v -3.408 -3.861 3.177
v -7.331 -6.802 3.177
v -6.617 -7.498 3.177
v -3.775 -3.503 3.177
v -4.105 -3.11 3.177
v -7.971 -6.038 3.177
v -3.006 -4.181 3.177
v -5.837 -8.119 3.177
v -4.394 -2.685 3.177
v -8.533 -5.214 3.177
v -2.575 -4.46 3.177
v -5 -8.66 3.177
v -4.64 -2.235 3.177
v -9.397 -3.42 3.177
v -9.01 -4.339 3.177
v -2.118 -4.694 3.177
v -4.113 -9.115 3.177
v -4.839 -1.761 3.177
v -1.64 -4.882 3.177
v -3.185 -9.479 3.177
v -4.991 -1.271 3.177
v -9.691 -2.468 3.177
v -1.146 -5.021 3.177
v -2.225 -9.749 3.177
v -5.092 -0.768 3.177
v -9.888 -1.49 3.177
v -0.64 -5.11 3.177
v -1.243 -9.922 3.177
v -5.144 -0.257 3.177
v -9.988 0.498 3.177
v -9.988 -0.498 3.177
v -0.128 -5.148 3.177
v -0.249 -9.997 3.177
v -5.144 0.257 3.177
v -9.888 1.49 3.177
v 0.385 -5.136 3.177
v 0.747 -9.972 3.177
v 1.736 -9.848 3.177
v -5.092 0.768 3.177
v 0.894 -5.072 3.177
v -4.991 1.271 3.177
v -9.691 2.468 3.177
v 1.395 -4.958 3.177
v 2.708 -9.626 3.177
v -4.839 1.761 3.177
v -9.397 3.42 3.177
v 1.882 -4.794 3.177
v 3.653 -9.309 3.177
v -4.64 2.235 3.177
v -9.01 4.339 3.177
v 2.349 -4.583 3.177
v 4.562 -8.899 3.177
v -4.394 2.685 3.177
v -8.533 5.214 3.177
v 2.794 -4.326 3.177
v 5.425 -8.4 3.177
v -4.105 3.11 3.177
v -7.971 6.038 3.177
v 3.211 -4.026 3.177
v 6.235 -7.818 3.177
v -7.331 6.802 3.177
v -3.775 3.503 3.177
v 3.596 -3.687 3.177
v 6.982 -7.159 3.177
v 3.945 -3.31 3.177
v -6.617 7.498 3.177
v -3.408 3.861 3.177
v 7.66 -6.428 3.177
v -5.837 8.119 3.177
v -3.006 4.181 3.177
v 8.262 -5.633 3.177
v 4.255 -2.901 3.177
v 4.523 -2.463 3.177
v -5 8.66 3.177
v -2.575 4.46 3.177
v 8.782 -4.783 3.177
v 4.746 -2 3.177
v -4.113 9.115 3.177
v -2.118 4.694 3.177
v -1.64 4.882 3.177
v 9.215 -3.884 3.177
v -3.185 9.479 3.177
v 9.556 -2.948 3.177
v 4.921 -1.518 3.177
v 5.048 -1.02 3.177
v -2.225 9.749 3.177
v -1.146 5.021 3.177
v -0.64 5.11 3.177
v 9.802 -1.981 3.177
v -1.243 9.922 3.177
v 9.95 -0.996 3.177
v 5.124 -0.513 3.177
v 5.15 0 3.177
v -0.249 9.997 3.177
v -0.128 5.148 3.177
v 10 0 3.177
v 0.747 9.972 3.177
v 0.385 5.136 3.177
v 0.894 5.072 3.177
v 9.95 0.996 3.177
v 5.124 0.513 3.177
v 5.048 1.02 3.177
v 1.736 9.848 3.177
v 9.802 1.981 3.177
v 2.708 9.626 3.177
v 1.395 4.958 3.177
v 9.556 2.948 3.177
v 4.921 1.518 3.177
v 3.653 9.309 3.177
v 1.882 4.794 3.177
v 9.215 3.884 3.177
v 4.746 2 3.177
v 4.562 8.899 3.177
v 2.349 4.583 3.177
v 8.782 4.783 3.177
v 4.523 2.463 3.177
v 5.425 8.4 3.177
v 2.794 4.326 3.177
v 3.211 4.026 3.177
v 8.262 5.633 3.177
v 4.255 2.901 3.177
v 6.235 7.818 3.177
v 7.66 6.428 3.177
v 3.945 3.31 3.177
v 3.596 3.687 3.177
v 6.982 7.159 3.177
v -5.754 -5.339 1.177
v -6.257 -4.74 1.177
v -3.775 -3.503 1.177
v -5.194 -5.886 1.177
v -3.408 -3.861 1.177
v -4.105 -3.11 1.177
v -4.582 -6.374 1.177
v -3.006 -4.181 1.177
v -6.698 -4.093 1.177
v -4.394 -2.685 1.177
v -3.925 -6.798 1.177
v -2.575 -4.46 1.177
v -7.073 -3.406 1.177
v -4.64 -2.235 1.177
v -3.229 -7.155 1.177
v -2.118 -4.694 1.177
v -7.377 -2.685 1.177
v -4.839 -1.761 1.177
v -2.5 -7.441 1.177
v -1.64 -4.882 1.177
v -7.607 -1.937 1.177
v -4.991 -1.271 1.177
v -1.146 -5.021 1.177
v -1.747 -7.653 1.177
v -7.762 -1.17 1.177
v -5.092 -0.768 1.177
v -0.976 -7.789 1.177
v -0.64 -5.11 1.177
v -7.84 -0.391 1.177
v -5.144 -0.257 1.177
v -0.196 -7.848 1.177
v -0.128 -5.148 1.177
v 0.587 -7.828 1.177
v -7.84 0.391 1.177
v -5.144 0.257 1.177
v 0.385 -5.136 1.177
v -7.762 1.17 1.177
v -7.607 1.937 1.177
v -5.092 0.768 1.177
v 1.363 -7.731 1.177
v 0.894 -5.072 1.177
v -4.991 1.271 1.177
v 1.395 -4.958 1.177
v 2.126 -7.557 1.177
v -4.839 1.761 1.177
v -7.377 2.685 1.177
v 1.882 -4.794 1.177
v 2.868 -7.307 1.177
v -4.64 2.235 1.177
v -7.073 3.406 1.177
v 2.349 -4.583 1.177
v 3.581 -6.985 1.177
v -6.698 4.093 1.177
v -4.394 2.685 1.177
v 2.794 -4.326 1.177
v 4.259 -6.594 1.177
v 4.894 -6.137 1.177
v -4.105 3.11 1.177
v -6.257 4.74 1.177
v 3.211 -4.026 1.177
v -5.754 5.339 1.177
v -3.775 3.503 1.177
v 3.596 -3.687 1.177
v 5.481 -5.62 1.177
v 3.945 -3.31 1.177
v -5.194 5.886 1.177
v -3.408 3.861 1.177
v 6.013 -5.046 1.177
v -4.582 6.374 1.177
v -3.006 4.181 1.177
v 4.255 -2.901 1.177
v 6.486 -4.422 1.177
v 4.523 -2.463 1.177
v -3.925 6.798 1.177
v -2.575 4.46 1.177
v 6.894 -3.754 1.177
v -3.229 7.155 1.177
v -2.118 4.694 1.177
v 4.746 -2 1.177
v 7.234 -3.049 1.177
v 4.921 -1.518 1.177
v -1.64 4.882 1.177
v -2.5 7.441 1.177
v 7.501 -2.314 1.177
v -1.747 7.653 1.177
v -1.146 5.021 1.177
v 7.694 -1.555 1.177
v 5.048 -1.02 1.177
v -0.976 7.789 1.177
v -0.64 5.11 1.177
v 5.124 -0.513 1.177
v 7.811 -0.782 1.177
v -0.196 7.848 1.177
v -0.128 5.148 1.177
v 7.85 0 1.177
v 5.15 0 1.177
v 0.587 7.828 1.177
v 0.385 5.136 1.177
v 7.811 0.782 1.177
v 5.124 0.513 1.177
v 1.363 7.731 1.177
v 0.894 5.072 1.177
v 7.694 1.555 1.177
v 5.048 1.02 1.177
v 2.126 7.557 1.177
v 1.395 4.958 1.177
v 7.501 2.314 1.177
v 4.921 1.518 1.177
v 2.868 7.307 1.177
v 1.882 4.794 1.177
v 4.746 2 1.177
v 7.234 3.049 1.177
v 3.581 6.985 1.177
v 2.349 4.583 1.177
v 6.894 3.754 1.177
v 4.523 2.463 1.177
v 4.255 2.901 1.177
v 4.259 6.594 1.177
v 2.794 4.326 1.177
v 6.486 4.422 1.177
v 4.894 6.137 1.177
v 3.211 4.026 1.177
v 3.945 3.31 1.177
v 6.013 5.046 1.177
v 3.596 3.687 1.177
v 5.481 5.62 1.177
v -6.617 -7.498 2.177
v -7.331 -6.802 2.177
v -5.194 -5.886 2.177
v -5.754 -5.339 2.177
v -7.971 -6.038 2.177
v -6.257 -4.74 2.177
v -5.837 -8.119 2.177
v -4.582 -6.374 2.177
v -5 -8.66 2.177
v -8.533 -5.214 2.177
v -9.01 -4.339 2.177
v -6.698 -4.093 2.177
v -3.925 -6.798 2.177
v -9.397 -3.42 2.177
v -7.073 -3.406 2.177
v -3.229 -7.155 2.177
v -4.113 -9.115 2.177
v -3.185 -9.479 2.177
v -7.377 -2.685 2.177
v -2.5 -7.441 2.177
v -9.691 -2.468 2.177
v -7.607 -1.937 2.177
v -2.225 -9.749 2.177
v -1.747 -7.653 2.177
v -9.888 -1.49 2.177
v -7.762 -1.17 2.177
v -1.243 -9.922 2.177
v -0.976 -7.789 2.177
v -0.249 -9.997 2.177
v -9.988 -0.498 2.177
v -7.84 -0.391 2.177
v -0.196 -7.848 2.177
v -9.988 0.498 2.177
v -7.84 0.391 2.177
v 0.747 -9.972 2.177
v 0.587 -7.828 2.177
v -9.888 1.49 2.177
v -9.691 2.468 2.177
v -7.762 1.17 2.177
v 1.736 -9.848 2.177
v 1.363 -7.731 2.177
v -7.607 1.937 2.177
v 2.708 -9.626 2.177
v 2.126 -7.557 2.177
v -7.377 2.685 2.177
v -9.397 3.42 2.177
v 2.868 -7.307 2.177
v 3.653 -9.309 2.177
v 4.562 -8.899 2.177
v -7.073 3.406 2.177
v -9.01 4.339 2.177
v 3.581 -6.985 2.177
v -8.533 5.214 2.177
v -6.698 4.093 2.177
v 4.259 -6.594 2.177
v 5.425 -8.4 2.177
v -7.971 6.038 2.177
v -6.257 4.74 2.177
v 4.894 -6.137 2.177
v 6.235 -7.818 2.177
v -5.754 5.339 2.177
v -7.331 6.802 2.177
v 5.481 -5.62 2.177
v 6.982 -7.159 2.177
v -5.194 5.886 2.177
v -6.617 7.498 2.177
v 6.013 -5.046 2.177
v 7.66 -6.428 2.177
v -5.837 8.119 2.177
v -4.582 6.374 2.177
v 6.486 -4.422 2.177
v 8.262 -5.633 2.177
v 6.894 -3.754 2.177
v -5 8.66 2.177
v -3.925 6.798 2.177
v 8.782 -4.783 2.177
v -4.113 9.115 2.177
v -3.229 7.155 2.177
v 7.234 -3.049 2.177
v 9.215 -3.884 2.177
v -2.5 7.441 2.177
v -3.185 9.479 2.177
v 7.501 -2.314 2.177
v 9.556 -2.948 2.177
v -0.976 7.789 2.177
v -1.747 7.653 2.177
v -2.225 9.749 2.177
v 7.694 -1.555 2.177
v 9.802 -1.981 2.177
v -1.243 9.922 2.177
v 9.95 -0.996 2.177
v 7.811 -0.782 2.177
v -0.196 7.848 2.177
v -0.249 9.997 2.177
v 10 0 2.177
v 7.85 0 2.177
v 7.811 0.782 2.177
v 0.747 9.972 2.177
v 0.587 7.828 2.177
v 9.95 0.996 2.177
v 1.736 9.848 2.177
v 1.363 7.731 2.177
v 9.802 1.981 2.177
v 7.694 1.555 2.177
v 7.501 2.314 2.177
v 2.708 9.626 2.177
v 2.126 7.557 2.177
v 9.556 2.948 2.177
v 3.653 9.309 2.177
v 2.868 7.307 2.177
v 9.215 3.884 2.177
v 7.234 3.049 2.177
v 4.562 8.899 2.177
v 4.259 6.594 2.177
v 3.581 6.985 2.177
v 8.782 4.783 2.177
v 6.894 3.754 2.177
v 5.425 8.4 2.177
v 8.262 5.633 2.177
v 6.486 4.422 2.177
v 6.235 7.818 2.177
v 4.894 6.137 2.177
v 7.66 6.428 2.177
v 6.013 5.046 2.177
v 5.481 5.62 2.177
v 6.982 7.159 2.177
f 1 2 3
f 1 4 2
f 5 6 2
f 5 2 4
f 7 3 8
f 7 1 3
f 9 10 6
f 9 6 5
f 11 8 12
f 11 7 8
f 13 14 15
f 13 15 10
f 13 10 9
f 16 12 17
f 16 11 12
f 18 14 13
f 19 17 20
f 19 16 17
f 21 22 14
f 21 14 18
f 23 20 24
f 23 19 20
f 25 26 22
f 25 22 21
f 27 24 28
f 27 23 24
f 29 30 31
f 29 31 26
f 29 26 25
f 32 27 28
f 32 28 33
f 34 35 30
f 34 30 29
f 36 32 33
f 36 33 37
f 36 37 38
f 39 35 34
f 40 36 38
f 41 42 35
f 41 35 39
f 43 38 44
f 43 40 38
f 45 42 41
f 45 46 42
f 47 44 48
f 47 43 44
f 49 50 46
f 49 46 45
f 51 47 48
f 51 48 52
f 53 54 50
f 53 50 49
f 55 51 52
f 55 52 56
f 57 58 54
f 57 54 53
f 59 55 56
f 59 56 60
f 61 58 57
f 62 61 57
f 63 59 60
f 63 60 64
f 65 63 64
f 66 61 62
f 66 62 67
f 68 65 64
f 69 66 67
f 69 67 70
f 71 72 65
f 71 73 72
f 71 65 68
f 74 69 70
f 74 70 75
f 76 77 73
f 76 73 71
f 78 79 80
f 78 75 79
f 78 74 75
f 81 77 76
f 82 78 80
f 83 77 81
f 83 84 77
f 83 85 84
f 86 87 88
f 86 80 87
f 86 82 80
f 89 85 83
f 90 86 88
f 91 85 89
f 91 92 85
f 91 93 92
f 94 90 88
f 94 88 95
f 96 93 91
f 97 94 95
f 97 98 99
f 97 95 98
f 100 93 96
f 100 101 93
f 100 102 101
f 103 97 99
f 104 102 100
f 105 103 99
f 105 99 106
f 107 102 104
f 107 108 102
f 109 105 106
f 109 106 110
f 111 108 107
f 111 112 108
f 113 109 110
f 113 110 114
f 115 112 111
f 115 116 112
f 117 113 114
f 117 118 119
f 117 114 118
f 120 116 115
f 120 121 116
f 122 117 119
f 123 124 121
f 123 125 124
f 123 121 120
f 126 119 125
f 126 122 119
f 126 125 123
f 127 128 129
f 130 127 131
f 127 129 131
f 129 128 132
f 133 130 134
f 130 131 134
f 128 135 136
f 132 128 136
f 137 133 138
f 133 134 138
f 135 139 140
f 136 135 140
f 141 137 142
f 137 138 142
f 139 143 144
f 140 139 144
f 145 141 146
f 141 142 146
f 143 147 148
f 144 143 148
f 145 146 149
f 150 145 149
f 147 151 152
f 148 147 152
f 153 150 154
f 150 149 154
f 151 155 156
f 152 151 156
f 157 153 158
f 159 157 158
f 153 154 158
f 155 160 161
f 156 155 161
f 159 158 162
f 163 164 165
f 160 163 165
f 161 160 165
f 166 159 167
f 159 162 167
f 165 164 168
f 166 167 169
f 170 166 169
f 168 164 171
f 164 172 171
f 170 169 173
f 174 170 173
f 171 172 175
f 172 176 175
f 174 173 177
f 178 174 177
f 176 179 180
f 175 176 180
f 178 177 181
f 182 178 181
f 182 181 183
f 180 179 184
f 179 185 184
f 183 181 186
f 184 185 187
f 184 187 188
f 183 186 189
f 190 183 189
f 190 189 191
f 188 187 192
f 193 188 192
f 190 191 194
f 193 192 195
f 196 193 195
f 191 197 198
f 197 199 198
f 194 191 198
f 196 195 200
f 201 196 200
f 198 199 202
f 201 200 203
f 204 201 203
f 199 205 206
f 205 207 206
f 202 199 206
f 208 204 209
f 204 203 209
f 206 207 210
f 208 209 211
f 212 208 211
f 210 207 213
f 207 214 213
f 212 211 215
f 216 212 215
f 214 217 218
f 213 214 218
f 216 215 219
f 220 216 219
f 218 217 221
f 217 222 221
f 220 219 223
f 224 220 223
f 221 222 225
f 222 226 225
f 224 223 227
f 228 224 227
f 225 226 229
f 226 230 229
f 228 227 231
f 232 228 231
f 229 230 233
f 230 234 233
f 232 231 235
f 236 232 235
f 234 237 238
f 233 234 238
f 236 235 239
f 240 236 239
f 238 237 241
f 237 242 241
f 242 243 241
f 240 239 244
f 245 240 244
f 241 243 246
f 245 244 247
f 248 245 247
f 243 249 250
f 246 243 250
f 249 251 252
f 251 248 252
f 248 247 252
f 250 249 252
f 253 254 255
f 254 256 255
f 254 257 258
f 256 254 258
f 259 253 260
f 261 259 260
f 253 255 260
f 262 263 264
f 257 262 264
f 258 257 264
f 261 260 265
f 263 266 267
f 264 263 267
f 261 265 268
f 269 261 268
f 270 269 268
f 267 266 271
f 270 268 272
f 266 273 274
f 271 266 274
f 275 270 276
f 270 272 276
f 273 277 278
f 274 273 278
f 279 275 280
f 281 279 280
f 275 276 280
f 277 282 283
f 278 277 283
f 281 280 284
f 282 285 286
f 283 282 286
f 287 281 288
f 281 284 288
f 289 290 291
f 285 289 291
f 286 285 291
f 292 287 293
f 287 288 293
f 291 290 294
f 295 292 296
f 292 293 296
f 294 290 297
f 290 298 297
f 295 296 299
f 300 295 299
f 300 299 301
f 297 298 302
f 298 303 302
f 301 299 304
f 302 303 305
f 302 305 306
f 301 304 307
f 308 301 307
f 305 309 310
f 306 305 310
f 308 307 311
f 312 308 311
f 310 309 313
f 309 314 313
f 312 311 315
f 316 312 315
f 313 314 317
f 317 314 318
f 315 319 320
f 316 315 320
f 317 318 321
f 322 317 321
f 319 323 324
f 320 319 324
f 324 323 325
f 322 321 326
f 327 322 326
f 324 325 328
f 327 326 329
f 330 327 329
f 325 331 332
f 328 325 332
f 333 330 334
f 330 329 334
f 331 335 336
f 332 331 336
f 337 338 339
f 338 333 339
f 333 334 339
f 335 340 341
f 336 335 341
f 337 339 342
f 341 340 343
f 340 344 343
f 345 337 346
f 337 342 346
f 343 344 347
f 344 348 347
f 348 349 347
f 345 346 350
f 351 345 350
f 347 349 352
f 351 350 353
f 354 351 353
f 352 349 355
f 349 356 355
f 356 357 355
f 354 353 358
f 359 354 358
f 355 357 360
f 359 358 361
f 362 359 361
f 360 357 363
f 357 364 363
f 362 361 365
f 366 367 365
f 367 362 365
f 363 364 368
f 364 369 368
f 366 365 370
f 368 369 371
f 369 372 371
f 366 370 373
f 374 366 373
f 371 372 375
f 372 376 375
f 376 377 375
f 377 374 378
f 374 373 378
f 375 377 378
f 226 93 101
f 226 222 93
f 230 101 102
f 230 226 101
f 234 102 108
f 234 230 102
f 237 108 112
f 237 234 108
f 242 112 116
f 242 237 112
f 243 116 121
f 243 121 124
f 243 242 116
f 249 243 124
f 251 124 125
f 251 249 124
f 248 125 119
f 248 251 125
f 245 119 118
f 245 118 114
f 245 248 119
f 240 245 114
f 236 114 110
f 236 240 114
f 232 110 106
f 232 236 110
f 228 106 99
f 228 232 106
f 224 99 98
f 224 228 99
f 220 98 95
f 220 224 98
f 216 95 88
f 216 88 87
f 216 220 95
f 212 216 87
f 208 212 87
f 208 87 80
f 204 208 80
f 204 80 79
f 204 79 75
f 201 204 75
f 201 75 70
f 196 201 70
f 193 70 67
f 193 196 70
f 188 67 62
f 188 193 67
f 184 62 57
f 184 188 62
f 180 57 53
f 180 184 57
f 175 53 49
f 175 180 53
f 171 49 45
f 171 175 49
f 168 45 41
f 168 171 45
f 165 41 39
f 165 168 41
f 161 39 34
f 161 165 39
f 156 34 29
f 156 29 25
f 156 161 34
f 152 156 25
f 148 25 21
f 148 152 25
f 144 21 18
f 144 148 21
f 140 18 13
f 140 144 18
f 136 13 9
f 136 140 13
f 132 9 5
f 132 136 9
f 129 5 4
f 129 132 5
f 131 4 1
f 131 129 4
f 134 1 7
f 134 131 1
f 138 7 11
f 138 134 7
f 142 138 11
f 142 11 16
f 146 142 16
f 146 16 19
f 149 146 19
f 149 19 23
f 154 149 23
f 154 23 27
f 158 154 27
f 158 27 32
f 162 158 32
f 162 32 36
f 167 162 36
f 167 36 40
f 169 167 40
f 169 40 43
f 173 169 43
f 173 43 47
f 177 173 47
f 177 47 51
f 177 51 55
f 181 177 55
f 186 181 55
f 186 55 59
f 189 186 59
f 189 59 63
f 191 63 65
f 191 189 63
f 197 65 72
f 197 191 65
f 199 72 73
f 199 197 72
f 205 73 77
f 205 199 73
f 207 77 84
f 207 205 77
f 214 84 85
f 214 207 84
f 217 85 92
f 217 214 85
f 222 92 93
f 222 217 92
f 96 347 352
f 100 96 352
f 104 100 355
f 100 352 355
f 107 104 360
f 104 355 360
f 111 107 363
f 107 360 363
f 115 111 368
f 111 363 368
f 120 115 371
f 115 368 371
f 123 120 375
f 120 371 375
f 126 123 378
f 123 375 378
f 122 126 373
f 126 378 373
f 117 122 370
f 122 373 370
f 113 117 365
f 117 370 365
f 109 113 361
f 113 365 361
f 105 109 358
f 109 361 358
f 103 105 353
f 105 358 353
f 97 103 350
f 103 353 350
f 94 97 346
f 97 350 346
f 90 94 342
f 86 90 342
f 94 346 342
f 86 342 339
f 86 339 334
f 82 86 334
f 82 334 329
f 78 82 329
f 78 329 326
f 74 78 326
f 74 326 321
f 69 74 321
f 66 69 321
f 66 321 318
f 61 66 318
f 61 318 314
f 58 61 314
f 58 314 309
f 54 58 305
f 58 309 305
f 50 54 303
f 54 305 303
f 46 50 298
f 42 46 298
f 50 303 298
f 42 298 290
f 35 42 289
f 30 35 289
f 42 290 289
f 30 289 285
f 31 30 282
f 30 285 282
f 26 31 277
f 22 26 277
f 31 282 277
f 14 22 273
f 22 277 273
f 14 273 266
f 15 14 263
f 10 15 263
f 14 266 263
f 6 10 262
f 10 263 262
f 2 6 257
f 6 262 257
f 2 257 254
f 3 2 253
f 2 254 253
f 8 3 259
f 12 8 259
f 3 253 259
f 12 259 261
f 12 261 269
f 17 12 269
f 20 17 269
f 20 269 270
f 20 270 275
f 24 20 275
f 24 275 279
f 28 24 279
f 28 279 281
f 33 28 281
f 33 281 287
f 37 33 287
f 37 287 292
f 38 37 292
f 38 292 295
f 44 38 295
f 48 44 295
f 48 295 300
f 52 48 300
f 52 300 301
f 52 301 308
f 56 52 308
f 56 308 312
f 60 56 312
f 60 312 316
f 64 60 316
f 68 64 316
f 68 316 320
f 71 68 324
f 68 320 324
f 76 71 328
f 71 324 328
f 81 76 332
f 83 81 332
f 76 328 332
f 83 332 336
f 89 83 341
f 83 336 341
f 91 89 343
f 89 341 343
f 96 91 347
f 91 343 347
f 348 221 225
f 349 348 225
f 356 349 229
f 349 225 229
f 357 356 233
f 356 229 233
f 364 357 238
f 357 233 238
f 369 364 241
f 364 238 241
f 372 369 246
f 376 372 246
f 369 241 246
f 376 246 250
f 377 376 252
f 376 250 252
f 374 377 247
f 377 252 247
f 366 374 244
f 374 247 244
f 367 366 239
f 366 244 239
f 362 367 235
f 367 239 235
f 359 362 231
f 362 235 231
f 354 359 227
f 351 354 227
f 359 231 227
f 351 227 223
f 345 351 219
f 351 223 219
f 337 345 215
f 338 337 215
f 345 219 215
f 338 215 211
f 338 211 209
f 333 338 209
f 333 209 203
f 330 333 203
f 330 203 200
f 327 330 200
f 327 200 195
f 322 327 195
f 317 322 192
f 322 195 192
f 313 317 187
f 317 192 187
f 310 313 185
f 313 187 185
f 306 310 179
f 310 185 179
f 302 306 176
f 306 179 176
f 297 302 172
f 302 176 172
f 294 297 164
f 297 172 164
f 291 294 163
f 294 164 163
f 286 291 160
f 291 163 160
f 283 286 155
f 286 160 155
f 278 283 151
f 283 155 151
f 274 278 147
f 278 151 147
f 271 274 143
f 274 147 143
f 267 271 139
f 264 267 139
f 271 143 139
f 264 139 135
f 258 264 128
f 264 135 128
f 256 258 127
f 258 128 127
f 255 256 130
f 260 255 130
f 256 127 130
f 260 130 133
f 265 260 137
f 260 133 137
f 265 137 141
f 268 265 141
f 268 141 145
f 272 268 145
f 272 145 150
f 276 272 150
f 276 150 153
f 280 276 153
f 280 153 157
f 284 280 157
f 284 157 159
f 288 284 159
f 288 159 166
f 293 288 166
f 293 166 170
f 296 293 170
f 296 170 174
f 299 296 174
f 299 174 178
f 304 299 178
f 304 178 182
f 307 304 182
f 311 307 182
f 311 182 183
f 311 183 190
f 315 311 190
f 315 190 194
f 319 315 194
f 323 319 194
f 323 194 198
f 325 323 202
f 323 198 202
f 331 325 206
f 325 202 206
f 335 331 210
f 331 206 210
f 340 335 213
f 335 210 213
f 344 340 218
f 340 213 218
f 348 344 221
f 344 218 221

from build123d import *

# Parameters (mm, degrees)
ESQUISSE1_R        = 15.7
ESQUISSE1_R_2      = 10.3
BOSS_EXTRU_1_DEPTH = 2
ESQUISSE2_R        = 20
ESQUISSE2_R_2      = 15.7
ESQUISSE2_R_3      = 10.3
BOSS_EXTRU_3_DEPTH = 2
ECHELLE1_SCALE     = 2
ECHELLE2_SCALE     = 0.25


with BuildPart() as part:
    # Esquisse1 → Boss.-Extru.1 (new body)
    with BuildSketch(Plane.XY):
        Circle(ESQUISSE1_R)
        Circle(ESQUISSE1_R_2, mode=Mode.SUBTRACT)
    extrude(amount=BOSS_EXTRU_1_DEPTH)

    # Esquisse2 → Boss.-Extru.3 (add)
    # profile 1 of 2: a face of its own
    with BuildSketch(Plane.XY.offset(2)):
        Circle(ESQUISSE2_R)
        Circle(ESQUISSE2_R_2, mode=Mode.SUBTRACT)
    # profile 2 of 2: a face of its own
    with BuildSketch(Plane.XY.offset(2)):
        Circle(ESQUISSE2_R_2)
        Circle(ESQUISSE2_R_3, mode=Mode.SUBTRACT)
    extrude(amount=BOSS_EXTRU_3_DEPTH)


with BuildPart() as part_1:
    # Echelle1: scaled about (0, 0, 2.353457208)
    add(part.part.scale(ECHELLE1_SCALE).moved(Location((0, 0, -2.353457208))))


with BuildPart() as part_2:
    # Echelle2: scaled about (0, 0, 2.353457208)
    add(part_1.part.scale(ECHELLE2_SCALE).moved(Location((0, 0, 1.765092906))))


solid = part_2.part
